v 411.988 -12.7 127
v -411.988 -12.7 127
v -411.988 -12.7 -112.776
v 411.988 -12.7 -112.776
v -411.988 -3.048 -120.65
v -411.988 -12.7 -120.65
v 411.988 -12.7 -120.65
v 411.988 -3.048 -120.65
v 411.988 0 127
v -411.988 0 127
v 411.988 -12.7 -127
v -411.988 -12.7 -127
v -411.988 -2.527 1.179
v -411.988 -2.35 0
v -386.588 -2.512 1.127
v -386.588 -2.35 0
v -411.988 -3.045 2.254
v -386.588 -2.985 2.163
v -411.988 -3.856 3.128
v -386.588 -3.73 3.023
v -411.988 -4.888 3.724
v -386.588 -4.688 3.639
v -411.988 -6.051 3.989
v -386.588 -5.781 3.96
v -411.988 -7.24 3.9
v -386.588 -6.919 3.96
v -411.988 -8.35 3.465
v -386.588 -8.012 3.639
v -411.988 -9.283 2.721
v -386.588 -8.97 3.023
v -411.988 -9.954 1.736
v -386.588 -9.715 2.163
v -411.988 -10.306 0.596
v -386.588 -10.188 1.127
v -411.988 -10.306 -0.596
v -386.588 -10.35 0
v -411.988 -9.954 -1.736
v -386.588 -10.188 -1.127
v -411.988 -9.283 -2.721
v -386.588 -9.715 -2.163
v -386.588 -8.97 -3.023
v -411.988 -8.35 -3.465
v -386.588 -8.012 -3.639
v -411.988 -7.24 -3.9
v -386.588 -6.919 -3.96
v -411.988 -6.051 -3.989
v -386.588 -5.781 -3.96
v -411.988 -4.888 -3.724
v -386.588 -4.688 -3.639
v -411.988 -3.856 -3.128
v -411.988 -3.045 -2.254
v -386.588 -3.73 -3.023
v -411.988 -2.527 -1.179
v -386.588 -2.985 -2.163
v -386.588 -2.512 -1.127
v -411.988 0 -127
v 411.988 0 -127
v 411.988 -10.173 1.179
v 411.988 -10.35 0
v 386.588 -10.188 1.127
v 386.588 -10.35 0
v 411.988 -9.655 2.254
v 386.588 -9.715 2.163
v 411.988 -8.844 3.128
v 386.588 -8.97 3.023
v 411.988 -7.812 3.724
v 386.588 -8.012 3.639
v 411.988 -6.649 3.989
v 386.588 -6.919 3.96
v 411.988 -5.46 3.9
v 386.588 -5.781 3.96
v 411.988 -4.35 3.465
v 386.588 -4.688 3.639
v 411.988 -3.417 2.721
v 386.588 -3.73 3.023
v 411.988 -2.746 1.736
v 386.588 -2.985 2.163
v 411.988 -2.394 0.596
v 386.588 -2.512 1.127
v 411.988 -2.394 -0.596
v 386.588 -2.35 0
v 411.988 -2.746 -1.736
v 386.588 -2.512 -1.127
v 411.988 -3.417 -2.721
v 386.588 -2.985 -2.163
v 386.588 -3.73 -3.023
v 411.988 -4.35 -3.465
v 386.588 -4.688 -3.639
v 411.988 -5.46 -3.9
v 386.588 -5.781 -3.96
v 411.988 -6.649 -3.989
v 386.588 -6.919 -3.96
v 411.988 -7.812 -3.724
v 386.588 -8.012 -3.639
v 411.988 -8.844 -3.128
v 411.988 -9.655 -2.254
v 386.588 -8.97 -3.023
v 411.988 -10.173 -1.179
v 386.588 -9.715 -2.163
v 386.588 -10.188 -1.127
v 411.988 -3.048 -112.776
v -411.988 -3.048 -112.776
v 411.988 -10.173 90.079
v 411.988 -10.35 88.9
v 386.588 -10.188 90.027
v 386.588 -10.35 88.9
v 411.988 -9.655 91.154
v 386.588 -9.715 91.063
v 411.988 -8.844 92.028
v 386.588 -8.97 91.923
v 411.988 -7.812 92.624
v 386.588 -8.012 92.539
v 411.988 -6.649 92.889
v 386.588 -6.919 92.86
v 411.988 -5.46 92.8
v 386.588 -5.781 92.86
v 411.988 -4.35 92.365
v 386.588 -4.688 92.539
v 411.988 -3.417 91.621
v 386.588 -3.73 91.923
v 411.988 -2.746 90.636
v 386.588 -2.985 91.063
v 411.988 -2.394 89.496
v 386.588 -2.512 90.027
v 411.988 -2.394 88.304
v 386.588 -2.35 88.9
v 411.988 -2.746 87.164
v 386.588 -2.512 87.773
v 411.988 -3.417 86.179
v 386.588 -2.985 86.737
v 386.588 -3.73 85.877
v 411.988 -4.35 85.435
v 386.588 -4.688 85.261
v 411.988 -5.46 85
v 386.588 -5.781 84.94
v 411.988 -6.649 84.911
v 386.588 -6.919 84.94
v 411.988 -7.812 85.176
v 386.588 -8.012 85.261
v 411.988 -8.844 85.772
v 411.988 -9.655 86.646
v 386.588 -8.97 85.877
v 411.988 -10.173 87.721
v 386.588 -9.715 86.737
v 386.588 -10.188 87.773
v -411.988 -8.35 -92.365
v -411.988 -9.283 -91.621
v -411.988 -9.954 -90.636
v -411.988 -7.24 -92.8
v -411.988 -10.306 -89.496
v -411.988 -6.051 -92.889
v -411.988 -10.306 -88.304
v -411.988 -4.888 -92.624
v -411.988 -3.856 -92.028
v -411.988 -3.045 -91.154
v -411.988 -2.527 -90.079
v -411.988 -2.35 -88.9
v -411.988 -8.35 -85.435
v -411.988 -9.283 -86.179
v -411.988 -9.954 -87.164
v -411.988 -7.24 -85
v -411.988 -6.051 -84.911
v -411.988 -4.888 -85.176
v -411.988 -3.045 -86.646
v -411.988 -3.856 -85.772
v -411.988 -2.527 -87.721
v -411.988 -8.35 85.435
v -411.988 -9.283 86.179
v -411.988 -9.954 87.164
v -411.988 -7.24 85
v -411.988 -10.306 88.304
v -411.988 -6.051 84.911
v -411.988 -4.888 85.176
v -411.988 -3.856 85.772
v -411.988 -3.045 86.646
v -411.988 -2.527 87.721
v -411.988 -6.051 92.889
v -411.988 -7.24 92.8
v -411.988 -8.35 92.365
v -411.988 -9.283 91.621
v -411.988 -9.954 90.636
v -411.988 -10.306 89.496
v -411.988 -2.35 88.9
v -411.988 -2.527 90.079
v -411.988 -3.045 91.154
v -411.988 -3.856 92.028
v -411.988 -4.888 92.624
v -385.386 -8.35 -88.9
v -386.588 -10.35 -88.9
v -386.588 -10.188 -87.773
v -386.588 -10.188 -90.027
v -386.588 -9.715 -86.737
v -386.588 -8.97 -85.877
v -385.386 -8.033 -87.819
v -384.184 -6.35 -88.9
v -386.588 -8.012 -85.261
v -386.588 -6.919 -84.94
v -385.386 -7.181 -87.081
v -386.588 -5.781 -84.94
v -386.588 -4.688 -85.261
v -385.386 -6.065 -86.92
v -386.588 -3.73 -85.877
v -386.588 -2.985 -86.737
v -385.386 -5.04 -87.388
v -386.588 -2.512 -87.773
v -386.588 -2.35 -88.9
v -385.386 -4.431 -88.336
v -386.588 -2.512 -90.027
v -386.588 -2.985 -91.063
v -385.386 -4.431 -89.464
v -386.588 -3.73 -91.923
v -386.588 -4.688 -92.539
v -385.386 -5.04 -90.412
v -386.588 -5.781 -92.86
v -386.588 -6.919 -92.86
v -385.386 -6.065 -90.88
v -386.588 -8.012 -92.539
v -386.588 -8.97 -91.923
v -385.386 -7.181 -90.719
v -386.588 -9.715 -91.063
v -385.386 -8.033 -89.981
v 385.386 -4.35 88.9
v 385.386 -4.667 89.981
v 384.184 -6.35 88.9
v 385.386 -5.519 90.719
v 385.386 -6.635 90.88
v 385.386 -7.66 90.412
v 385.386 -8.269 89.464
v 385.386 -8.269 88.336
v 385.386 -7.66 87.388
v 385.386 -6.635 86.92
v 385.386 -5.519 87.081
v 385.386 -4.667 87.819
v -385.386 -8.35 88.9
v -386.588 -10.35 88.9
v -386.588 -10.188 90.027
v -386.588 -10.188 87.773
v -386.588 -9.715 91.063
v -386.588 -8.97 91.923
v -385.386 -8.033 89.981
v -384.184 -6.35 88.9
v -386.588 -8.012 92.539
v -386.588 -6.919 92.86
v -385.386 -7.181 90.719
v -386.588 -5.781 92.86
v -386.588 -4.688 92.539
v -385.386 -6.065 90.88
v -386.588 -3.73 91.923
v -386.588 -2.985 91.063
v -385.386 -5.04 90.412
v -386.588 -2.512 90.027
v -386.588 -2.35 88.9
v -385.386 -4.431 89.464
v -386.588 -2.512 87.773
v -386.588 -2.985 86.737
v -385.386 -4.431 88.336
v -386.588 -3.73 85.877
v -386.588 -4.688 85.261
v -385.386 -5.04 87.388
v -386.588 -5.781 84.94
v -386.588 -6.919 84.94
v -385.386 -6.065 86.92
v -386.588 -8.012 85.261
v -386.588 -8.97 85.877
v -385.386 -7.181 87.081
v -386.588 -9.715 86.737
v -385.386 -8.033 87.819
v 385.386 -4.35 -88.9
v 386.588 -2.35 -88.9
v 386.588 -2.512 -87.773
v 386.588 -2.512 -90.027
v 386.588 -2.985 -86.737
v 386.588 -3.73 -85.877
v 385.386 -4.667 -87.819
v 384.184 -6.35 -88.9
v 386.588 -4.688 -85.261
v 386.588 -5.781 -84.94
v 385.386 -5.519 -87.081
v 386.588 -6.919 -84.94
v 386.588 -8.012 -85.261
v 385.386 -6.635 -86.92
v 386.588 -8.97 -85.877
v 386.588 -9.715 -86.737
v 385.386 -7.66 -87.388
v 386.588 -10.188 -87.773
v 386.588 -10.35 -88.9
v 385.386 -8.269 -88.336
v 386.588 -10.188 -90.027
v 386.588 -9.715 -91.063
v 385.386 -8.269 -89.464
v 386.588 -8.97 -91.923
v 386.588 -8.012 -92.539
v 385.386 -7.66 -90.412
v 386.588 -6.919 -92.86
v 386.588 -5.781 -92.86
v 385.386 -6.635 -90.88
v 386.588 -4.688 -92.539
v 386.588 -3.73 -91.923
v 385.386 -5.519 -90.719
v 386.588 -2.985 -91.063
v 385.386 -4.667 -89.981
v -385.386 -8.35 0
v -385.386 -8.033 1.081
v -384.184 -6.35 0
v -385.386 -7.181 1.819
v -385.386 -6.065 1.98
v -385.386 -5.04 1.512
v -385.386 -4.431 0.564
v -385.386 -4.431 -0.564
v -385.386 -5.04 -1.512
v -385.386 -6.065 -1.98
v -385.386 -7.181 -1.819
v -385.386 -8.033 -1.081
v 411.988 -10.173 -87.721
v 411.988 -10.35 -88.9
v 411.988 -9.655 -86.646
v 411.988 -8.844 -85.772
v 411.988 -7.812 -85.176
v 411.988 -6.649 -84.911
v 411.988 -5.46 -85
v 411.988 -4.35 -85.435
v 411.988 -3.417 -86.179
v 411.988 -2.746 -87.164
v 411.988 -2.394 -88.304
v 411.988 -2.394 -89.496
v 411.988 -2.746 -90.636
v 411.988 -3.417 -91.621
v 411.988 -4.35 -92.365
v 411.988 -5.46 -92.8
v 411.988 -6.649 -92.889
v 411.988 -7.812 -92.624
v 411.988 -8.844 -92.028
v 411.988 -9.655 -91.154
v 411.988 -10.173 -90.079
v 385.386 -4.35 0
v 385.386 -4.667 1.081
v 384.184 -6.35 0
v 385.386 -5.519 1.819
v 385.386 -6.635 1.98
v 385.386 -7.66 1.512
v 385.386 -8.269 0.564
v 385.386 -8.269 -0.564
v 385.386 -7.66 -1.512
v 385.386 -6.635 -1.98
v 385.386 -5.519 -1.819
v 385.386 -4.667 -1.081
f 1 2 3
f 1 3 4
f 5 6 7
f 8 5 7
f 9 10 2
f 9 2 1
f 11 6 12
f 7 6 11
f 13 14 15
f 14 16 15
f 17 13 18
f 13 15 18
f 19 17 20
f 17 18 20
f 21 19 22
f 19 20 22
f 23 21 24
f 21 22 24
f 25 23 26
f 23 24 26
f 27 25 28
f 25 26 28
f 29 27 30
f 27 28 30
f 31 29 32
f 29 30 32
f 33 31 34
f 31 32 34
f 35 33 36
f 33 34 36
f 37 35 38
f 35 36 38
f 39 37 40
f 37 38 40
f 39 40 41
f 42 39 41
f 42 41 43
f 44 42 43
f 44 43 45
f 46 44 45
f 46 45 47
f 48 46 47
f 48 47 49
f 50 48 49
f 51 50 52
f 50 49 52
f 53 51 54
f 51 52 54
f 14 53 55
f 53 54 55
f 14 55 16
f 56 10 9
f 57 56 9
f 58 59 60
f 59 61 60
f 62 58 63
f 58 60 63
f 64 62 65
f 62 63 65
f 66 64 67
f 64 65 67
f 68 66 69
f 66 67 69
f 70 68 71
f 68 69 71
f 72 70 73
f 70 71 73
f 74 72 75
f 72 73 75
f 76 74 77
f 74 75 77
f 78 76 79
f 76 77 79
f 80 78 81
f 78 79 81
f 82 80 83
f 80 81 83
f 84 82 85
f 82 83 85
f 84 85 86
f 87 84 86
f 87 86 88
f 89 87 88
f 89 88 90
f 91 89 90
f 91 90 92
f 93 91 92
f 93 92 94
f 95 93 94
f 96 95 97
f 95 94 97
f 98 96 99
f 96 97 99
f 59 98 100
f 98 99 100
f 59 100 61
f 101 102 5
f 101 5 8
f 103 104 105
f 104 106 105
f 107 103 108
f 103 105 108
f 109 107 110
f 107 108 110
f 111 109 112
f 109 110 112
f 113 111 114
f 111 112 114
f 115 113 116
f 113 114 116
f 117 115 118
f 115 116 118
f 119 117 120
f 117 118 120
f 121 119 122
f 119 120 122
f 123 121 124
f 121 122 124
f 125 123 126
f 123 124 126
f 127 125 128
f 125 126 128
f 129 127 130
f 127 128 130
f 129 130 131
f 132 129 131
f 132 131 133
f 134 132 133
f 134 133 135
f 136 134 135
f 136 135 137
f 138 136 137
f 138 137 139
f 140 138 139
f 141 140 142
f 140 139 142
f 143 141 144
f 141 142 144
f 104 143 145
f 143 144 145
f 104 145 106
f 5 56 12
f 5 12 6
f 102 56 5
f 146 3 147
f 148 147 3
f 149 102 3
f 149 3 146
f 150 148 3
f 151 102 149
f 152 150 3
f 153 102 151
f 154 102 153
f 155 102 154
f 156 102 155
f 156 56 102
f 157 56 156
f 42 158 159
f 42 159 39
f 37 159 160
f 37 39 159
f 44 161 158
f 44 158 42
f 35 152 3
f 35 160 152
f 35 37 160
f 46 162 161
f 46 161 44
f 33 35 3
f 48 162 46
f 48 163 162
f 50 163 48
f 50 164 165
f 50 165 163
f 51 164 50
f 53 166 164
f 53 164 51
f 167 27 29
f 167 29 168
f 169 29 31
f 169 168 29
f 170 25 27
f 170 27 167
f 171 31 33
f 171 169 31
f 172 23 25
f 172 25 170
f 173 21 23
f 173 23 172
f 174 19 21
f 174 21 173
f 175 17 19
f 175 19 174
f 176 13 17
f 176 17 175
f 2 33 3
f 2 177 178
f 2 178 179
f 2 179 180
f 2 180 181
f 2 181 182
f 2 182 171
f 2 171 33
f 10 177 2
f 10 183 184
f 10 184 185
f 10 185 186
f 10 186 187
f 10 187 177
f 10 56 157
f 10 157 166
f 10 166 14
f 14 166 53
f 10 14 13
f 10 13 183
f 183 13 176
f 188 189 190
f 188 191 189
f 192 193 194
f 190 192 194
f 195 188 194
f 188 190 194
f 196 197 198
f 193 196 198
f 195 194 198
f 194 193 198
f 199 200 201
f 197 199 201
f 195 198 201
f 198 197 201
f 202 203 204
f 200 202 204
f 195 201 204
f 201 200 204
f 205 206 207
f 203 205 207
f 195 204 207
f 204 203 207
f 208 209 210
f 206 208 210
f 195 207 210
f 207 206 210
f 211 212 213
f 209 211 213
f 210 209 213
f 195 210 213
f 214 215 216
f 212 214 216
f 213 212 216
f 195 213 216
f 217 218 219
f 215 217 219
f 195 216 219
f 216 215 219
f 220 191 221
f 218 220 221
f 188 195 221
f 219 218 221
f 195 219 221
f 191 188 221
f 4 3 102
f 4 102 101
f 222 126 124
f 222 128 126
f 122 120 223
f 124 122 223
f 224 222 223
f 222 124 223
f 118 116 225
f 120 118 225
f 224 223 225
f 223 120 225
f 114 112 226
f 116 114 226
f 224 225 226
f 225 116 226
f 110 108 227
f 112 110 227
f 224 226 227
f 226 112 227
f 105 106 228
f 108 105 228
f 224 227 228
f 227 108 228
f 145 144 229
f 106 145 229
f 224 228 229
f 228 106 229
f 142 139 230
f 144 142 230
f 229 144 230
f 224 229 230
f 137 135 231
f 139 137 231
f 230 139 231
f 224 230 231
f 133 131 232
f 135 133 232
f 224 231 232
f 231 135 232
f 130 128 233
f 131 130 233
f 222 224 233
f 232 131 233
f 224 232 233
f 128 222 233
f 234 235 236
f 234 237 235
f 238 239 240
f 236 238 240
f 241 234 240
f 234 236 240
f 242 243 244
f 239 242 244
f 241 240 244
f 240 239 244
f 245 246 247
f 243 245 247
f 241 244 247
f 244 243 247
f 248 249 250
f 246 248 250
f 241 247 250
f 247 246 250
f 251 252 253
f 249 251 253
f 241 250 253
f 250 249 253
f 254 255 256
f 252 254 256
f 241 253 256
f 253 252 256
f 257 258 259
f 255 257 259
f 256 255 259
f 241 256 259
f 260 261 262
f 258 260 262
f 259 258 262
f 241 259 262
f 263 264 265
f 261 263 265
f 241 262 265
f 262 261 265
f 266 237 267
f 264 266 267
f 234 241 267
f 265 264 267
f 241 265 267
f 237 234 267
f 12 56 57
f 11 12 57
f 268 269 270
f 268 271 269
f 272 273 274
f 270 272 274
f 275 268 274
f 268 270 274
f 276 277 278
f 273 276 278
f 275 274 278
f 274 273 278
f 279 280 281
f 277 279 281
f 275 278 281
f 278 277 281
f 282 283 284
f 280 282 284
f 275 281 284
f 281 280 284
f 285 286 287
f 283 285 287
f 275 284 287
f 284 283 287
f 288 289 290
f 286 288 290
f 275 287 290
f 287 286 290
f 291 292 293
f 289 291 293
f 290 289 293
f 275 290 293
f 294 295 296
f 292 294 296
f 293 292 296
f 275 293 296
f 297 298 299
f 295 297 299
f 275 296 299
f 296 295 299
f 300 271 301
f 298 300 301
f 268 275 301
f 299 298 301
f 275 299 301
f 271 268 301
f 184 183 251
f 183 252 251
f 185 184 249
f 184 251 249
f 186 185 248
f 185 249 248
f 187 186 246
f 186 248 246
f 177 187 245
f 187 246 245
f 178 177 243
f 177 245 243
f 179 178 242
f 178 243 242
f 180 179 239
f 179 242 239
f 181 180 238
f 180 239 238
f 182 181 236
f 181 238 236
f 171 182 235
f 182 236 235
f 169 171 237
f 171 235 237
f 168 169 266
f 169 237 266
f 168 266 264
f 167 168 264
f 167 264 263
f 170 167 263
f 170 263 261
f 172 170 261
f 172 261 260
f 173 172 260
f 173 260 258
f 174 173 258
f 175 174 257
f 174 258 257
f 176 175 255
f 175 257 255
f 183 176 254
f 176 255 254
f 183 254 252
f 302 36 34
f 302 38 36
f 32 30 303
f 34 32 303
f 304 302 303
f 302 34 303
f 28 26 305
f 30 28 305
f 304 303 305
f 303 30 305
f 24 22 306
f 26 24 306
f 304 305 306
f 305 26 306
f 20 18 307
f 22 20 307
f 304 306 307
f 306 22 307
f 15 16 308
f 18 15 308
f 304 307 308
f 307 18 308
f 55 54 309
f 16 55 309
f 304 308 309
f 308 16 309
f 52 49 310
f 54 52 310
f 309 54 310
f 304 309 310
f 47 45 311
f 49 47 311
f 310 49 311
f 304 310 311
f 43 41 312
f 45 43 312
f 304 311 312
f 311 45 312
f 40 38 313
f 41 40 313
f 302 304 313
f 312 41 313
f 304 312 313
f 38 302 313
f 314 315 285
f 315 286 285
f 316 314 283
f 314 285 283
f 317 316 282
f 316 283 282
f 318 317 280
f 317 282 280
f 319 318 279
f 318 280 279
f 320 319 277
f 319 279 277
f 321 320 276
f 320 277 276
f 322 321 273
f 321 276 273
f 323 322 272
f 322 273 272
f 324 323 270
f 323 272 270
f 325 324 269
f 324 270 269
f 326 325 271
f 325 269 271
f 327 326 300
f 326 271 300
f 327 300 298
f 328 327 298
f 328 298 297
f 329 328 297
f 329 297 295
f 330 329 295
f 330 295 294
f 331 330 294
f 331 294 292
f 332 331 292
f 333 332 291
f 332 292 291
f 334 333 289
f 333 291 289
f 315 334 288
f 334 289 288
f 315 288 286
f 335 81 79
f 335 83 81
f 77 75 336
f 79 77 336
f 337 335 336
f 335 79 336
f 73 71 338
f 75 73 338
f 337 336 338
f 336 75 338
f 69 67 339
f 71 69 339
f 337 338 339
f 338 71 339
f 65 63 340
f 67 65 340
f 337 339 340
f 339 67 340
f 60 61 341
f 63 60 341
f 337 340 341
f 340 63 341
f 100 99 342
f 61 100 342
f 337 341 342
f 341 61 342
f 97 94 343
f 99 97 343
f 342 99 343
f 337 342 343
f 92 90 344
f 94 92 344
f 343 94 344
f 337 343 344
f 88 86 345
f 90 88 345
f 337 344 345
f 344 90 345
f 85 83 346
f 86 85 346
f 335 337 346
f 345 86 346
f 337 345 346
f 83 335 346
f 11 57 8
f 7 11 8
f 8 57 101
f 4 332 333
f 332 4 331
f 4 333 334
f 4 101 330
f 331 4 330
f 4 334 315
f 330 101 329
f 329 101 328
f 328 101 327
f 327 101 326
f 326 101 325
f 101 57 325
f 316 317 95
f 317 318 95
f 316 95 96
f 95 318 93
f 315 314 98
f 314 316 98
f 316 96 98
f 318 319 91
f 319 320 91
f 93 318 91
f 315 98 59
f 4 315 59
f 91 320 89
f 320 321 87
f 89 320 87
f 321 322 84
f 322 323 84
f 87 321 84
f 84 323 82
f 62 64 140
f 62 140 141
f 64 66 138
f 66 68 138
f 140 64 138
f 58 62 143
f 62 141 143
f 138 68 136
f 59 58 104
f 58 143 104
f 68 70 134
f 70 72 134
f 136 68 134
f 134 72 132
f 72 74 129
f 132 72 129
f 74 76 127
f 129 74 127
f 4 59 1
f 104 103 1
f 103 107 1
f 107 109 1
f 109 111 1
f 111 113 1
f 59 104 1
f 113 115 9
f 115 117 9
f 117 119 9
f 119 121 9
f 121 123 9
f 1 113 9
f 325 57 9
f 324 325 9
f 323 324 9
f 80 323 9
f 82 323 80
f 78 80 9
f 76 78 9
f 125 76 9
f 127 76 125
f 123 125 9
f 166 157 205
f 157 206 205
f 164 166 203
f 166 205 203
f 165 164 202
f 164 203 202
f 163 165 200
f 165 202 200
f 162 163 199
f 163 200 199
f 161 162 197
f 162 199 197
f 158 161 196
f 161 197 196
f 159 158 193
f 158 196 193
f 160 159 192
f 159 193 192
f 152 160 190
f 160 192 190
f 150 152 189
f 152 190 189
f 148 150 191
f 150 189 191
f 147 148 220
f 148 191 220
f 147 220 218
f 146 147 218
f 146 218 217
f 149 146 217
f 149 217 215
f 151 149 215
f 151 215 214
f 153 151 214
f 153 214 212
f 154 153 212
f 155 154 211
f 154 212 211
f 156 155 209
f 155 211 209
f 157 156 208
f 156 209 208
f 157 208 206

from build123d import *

# Parameters (mm, degrees)
F0_W     = 823.976
F0_H     = 254
F1_DEPTH = 12.7
F2_W     = 823.976
F2_H     = 7.874
F3_DEPTH = 9.652
F5_D     = 8.001
F5_DEPTH = 25.4
F5_TIP   = 2.4037429064
F7_D     = 8.001
F7_DEPTH = 25.4
F7_TIP   = 2.4037429064


with BuildPart() as f1:
    # F0 (on Front) → F1 (new body)
    with BuildSketch(Plane.XZ):
        Rectangle(F0_W, F0_H)
    extrude(amount=F1_DEPTH)

    # F2 (on face) → F3 (cut)
    with BuildSketch(Plane.XZ.offset(12.7)):
        with Locations((0, -116.713)):
            Rectangle(F2_W, F2_H)
    extrude(amount=-F3_DEPTH, mode=Mode.SUBTRACT)

    # F5
    with Locations(Plane(origin=(-411.988, 0, 0), x_dir=(0, -1, 0), z_dir=(-1, 0, 0))):
        with Locations((6.35, 88.9), (6.35, 0), (6.35, -88.9)):
            Hole(F5_D / 2, depth=F5_DEPTH)
            with Locations((0, 0, -(F5_DEPTH + F5_TIP / 2))):  # 118° drill point
                Cone(0, F5_D / 2, F5_TIP, mode=Mode.SUBTRACT)

    # F7
    with Locations(Plane.YZ.offset(411.988)):
        with Locations((-6.35, 88.9), (-6.35, 0), (-6.35, -88.9)):
            Hole(F7_D / 2, depth=F7_DEPTH)
            with Locations((0, 0, -(F7_DEPTH + F7_TIP / 2))):  # 118° drill point
                Cone(0, F7_D / 2, F7_TIP, mode=Mode.SUBTRACT)


solid = f1.part
